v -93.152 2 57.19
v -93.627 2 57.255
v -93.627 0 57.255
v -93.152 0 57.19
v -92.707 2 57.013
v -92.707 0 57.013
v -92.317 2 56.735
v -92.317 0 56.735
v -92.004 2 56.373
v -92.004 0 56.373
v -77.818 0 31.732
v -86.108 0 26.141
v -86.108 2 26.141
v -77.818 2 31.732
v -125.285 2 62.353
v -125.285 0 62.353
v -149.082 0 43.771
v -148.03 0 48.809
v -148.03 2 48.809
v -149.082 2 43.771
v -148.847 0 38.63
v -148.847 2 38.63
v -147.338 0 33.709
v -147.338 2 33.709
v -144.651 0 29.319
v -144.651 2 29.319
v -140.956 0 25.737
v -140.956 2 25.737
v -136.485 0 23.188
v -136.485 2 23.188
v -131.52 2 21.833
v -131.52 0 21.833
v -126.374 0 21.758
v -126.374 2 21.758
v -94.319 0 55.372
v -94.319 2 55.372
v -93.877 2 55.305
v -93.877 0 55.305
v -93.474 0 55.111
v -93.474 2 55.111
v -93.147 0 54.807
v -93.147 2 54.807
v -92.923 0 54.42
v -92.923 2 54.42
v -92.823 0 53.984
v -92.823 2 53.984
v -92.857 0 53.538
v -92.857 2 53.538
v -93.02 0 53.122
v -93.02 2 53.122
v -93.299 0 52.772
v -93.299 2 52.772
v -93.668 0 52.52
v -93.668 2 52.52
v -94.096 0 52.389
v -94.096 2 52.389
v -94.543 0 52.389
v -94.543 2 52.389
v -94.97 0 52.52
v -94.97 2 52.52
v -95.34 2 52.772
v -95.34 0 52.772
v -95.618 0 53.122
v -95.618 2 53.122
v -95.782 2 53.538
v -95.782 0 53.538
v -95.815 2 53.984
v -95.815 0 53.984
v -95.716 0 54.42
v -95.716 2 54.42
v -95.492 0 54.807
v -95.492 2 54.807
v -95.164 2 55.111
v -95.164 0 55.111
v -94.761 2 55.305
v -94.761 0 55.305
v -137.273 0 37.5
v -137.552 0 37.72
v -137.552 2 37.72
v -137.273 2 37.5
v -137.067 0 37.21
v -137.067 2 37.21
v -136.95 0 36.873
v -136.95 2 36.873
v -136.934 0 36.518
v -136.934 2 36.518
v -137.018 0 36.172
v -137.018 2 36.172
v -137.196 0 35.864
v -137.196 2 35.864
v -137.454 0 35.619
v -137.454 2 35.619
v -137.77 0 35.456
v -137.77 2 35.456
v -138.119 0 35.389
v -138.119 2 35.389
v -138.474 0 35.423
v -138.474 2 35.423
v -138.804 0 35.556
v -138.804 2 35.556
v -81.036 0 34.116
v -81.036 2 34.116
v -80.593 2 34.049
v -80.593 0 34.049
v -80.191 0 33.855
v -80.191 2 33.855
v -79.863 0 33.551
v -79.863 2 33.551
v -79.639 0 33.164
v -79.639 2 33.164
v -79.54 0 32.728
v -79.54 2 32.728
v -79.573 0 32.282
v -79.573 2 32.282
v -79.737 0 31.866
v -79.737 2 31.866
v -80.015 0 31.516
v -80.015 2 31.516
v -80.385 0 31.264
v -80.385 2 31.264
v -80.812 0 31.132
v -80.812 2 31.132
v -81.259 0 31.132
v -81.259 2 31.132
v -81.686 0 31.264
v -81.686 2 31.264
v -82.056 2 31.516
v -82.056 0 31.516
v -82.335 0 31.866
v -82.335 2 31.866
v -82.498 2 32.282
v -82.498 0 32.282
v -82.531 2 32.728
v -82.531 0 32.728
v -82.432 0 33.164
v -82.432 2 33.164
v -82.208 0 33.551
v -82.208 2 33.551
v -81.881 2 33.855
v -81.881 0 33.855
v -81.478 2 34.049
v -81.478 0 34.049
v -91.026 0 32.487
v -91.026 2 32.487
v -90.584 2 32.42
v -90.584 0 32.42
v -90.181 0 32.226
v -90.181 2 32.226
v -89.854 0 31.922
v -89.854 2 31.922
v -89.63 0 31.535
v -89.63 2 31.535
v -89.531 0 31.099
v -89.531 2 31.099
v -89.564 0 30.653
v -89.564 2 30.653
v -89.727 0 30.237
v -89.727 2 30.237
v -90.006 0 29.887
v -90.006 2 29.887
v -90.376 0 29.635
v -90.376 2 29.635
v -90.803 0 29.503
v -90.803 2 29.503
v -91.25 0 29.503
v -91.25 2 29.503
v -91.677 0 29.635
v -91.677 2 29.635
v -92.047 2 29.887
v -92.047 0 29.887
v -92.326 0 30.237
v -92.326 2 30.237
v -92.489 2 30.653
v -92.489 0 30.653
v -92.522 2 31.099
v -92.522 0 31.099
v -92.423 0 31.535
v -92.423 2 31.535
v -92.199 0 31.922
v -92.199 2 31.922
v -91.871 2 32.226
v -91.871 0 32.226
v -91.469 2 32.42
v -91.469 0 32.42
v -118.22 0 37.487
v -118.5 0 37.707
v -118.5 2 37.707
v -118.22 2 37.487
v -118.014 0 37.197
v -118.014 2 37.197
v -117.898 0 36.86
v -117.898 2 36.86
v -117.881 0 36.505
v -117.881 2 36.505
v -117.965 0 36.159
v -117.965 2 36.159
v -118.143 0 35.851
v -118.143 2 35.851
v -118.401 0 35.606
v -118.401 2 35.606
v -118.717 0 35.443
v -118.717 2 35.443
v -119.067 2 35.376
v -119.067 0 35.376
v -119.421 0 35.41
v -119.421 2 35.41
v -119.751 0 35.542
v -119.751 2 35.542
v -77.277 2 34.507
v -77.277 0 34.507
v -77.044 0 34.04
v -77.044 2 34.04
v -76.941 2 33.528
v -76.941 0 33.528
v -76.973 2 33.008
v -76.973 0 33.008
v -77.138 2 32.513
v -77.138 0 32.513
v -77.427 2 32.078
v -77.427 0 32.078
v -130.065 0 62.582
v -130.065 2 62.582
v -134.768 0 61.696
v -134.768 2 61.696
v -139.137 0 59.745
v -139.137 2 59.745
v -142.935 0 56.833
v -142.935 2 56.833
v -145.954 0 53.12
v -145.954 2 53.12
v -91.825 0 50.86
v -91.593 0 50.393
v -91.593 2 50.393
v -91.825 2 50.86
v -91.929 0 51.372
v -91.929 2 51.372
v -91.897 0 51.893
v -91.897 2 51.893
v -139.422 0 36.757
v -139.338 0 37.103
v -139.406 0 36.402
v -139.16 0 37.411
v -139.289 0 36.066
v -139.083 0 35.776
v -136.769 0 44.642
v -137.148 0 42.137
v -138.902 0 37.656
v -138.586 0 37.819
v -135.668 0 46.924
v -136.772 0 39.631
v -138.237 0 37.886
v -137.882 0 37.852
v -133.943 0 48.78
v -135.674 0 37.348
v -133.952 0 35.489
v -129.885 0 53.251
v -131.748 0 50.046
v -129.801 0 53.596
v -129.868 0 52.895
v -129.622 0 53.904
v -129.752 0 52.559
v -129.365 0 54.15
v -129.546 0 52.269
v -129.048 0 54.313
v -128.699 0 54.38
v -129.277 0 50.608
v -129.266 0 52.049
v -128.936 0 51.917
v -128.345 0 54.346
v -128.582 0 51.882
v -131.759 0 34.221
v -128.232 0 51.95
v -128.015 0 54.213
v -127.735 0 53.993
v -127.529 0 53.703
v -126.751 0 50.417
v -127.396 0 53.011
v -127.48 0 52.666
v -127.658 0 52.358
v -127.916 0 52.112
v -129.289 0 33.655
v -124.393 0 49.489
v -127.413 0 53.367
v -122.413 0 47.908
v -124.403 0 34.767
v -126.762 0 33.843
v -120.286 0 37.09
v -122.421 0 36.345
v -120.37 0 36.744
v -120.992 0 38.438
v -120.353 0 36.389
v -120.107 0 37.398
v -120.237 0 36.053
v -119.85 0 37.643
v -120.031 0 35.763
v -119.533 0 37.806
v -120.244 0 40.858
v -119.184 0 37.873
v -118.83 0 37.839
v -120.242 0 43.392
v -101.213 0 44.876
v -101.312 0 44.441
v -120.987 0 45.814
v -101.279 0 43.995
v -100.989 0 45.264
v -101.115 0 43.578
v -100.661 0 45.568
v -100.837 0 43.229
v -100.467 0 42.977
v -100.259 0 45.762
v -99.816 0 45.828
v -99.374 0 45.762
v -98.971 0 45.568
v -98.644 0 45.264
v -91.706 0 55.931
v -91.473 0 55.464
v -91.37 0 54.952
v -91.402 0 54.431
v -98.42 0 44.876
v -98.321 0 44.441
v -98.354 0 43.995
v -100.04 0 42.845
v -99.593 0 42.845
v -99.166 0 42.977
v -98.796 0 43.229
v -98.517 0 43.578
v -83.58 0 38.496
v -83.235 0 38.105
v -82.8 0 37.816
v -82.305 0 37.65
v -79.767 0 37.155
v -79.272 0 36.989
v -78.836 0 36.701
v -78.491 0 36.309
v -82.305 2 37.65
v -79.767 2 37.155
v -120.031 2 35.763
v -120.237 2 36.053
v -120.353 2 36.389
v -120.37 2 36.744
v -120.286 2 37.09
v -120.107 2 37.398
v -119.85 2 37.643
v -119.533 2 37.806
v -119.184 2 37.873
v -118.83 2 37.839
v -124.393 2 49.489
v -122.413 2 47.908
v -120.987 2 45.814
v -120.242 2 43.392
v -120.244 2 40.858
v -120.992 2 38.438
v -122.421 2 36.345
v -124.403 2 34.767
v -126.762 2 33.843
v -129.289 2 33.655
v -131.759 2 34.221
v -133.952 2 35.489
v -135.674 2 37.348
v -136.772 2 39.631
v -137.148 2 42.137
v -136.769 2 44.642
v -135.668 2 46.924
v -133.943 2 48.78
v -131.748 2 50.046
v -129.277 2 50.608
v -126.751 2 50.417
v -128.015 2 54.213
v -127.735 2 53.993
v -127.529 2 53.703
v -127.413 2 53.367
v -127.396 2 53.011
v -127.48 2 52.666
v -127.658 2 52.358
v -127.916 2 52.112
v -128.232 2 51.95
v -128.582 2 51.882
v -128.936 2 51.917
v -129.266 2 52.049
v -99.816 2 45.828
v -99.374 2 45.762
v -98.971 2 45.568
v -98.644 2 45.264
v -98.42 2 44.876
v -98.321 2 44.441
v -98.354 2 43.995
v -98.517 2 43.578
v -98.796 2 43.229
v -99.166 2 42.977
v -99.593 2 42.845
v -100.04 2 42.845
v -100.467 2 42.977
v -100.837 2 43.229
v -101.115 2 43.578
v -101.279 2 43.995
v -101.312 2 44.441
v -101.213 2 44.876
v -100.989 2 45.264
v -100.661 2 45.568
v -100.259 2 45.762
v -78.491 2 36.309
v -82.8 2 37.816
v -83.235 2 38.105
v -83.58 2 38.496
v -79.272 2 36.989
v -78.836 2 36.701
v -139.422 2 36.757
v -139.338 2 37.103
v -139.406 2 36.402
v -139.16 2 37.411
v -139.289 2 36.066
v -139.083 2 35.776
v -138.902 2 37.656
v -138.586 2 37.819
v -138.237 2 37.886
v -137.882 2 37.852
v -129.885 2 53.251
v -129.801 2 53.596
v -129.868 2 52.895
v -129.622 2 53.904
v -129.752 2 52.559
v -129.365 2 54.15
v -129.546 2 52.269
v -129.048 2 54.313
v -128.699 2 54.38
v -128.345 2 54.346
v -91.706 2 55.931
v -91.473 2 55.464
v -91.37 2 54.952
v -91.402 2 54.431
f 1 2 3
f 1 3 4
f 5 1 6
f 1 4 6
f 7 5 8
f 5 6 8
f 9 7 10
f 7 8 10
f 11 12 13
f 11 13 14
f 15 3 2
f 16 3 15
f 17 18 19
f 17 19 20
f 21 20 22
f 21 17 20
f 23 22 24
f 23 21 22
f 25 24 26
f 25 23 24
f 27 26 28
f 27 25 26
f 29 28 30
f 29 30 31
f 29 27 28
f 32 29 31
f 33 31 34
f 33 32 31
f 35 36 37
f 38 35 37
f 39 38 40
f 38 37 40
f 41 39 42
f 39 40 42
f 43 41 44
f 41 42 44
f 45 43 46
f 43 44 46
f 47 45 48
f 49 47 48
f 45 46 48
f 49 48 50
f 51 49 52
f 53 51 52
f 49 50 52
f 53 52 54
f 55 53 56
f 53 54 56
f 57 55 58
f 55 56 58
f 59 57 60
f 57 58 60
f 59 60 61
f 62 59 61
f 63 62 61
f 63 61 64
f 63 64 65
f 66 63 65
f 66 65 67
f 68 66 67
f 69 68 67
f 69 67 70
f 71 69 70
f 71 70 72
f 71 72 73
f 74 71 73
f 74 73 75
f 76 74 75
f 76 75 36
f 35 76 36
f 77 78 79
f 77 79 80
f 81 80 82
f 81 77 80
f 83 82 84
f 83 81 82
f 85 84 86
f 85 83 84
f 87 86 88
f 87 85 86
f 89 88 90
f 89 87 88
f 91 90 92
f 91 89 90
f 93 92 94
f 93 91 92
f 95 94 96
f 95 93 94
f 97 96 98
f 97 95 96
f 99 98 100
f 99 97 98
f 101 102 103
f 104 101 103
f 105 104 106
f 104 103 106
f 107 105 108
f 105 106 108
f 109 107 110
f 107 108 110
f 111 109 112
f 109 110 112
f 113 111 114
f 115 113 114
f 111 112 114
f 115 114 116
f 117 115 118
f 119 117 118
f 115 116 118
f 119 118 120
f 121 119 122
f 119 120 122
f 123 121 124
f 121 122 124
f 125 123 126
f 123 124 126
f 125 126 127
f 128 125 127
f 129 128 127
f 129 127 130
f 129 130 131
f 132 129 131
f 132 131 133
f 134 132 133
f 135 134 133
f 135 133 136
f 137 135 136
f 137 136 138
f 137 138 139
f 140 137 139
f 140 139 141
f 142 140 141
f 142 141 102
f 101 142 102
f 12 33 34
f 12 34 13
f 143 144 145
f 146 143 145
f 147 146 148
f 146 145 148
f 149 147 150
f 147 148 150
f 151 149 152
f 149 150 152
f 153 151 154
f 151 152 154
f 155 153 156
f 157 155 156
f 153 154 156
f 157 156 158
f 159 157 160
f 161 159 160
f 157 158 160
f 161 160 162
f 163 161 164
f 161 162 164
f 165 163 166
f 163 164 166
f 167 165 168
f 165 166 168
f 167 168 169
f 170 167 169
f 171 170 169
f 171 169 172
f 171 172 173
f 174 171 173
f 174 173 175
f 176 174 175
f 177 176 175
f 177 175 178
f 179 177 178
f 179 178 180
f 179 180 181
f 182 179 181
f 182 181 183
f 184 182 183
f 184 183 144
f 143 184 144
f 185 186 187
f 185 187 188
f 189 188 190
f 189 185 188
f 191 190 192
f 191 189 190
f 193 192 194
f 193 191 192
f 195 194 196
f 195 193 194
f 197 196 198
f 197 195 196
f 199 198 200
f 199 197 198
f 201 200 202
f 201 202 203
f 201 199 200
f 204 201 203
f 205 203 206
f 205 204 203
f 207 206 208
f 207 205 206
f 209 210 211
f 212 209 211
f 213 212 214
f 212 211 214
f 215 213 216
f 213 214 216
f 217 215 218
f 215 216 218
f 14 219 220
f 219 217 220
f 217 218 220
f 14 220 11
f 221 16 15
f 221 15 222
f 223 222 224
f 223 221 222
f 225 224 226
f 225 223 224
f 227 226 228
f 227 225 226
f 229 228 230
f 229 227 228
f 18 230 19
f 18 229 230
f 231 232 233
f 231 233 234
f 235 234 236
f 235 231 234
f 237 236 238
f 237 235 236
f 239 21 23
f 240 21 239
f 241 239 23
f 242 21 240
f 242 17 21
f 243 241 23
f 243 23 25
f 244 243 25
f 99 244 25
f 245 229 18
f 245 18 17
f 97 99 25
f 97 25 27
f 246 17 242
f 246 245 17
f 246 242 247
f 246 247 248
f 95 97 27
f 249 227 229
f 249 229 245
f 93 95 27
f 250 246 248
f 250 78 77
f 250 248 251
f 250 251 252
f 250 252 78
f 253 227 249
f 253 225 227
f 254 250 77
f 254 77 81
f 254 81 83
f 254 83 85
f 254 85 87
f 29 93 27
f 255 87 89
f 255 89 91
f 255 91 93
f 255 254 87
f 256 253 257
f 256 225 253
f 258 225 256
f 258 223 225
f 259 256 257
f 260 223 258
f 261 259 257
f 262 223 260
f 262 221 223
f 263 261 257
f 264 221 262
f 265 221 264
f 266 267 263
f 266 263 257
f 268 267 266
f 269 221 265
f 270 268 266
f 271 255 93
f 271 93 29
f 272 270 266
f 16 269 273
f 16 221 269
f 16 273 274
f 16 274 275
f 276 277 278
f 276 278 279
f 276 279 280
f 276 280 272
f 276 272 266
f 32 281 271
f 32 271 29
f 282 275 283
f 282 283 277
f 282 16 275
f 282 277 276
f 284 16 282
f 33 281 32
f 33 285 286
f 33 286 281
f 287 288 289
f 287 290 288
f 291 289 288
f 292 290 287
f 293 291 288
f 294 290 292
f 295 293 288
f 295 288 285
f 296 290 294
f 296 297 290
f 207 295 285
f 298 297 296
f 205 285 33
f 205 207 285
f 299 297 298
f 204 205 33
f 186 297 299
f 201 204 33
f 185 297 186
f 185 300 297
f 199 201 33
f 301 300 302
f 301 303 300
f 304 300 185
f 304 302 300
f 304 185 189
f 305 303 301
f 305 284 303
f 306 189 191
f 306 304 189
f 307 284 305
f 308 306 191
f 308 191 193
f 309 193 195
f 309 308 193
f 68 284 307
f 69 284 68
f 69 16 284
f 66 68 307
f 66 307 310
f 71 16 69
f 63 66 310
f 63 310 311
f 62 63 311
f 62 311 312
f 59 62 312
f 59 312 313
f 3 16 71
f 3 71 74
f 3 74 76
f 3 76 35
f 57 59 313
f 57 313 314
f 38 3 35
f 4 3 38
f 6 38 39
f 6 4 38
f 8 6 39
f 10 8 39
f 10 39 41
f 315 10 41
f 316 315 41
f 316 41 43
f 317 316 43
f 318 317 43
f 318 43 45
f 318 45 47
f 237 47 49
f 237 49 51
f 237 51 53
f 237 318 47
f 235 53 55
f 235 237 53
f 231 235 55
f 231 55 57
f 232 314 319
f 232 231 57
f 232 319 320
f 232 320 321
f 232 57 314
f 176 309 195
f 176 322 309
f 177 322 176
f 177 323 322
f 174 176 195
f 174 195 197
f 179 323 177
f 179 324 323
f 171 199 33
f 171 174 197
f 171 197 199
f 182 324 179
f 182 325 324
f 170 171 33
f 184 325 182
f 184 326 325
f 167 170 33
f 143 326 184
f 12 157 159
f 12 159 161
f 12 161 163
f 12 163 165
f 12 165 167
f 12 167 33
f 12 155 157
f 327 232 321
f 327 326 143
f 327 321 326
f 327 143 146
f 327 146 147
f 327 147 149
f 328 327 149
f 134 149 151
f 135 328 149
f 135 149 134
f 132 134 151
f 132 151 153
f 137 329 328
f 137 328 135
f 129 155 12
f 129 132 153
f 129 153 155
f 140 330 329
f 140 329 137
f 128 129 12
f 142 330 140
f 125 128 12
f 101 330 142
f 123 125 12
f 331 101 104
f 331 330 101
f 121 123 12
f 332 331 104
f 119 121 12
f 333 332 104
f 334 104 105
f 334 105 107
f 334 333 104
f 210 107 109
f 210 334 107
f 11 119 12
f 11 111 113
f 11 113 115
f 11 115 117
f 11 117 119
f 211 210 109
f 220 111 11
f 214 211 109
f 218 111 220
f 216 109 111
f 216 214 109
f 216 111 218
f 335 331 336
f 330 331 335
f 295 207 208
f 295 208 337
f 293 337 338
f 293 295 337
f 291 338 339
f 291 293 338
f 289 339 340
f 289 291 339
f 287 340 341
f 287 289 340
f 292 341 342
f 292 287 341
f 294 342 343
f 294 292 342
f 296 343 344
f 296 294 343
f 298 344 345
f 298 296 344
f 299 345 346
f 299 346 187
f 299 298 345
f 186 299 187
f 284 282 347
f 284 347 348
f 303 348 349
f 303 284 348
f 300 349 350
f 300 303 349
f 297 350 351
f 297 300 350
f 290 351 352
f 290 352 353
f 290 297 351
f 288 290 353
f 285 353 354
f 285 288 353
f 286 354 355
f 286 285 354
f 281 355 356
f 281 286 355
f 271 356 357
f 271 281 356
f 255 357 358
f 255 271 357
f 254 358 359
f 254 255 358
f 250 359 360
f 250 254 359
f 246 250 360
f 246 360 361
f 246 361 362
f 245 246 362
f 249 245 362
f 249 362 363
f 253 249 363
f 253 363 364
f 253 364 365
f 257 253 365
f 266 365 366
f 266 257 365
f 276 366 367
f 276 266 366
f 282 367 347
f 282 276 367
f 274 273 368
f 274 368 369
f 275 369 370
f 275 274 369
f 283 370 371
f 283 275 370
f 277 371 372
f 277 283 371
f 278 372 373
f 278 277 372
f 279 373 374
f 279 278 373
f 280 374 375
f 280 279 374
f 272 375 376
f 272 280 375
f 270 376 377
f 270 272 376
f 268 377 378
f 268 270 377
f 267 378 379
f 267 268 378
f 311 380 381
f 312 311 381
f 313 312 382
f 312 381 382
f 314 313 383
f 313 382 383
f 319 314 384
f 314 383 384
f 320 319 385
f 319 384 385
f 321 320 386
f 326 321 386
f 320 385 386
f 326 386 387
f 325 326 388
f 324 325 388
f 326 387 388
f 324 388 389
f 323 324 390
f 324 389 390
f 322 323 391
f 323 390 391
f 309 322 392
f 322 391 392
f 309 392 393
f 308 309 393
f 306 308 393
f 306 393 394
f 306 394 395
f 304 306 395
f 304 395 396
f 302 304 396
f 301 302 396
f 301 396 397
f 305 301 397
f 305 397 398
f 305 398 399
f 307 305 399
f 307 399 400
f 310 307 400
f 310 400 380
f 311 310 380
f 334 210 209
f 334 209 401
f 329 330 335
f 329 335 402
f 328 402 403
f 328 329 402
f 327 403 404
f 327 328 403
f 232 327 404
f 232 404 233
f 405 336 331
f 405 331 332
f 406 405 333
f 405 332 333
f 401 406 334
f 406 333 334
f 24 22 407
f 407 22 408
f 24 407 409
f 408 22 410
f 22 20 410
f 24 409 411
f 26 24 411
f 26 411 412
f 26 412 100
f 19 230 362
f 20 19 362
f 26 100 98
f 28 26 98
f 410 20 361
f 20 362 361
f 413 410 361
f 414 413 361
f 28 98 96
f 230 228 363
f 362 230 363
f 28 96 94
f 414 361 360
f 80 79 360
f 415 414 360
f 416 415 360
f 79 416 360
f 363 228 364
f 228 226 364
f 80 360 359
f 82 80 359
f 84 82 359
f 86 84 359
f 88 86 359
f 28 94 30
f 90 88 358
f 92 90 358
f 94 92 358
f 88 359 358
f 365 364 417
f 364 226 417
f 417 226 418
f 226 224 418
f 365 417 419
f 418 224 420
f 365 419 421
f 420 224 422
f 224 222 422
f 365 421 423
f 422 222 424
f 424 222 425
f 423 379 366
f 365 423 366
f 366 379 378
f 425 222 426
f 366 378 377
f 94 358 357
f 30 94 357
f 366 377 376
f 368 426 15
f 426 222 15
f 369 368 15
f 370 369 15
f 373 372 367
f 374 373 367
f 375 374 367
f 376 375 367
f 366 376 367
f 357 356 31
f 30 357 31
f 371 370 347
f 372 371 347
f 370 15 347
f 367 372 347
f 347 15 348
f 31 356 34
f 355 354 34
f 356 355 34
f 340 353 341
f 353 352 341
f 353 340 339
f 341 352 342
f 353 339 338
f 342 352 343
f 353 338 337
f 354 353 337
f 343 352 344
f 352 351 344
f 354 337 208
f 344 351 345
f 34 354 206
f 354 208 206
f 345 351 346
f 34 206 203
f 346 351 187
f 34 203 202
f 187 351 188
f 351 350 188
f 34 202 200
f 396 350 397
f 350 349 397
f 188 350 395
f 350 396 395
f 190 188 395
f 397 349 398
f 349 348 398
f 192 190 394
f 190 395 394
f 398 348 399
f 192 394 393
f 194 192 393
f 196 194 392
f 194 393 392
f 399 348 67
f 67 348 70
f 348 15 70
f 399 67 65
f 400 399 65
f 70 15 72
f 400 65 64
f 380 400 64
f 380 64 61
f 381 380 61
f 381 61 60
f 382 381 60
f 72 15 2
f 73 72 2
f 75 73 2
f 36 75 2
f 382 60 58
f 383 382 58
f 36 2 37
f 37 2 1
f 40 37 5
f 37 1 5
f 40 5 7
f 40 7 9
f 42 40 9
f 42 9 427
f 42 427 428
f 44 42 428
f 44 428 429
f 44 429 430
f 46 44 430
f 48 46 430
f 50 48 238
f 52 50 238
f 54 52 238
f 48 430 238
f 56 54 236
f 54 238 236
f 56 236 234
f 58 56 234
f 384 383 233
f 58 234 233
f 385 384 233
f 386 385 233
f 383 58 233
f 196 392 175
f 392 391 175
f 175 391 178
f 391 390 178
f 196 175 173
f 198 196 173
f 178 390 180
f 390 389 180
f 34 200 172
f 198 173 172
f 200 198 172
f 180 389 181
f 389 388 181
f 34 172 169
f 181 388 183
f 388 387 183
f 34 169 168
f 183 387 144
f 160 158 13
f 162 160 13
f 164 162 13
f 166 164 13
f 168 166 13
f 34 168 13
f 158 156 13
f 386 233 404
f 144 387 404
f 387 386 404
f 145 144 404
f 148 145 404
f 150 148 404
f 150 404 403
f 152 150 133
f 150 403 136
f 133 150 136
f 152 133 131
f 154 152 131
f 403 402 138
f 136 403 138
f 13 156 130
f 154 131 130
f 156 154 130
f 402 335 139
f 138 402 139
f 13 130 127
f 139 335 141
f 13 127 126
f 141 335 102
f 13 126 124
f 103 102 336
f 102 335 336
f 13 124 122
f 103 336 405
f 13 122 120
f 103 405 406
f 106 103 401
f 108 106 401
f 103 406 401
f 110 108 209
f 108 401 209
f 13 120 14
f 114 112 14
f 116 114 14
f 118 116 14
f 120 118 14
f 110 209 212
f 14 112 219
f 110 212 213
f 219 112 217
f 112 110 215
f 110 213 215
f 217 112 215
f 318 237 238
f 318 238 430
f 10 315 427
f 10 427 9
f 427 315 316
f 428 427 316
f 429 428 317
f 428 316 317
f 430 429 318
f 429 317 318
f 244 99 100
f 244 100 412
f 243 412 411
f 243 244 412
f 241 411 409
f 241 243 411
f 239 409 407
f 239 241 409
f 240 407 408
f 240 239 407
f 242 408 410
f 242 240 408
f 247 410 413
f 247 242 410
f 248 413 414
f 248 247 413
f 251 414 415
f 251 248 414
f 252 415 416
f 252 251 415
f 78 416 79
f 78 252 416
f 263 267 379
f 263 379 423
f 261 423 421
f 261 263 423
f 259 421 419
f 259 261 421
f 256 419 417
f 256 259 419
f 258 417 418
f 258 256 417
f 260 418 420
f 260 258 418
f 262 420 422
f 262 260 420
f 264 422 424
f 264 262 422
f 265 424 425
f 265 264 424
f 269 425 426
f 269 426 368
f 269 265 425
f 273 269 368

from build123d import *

# Parameters (mm, degrees)
BOSS_EXTRUDE1_DEPTH = 2
SKETCH2_R           = 1.5
CUT_EXTRUDE1_DEPTH  = 162.776916151
FILLET1_R           = 2


with BuildPart() as part:
    # Sketch1 → Boss-Extrude1 (new body)
    with BuildSketch(Plane(origin=(0, 0, 0), x_dir=(1, 0, 0), z_dir=(0, 1, 0))):
        with BuildLine():
            Line((-93.626923886, -57.255296936), (-125.285208035, -62.353434177))
            ThreePointArc((-125.285208035, -62.353434177), (-139.136930256, -59.744510113), (-148.029903031, -48.8087098))
            ThreePointArc((-148.029903031, -48.8087098), (-144.651370762, -29.319378812), (-126.373822338, -21.757651079))
            Line((-126.373822338, -21.757651079), (-86.108085396, -26.140585529))
            Line((-86.108085396, -26.140585529), (-76.160414707, -32.849365164))
            Line((-76.160414707, -32.849365164), (-78.953515167, -36.996483419))
            Line((-78.953515167, -36.996483419), (-83.117646396, -37.808894096))
            Line((-83.117646396, -37.808894096), (-92.055567869, -51.079672511))
            Line((-92.055567869, -51.079672511), (-91.243157193, -55.24380374))
            Line((-91.243157193, -55.24380374), (-92.919017469, -57.732074693))
            Line((-92.919017469, -57.732074693), (-93.626923886, -57.255296936))
        make_face()
        with BuildLine():
            ThreePointArc((-128.01465119, -54.213221054), (-127.558293409, -52.505375167), (-129.266139297, -52.049017386))
            ThreePointArc((-129.266139297, -52.049017386), (-129.722497078, -53.756863273), (-128.01465119, -54.213221054))
        make_face(mode=Mode.SUBTRACT)
        with BuildLine():
            ThreePointArc((-118.499717146, -37.706675985), (-118.043359364, -35.998830097), (-119.751205252, -35.542472316))
            ThreePointArc((-119.751205252, -35.542472316), (-120.207563033, -37.250318204), (-118.499717146, -37.706675985))
        make_face(mode=Mode.SUBTRACT)
        with BuildLine():
            ThreePointArc((-137.552271527, -37.719773921), (-137.095913745, -36.011928034), (-138.803759633, -35.555570253))
            ThreePointArc((-138.803759633, -35.555570253), (-139.260117414, -37.26341614), (-137.552271527, -37.719773921))
        make_face(mode=Mode.SUBTRACT)
        with BuildLine():
            ThreePointArc((-132.903016903, -34.772829346), (-136.006249814, -46.386181381), (-124.392897779, -49.489414293))
            ThreePointArc((-124.392897779, -49.489414293), (-121.289664867, -37.876062257), (-132.903016903, -34.772829346))
        make_face(mode=Mode.SUBTRACT)
    extrude(amount=BOSS_EXTRUDE1_DEPTH)

    # Sketch2 → Cut-Extrude1 (cut, through all)
    with BuildSketch(Plane(origin=(0, 2, 0), x_dir=(1, 0, 0), z_dir=(0, 1, 0))):
        with Locations(Location((-94.319257895, -53.871812037, 0), (0, 0, 270))):
            Circle(SKETCH2_R)
        with Locations(Location((-81.035580782, -32.615630622, 0), (0, 0, 270))):
            Circle(SKETCH2_R)
        with Locations(Location((-99.81641988, -44.328419171, 0), (0, 0, 270))):
            Circle(SKETCH2_R)
        with Locations(Location((-91.026470018, -30.986543755, 0), (0, 0, 270))):
            Circle(SKETCH2_R)
    extrude(amount=-CUT_EXTRUDE1_DEPTH, mode=Mode.SUBTRACT)

    # Fillet1
    # the kernel refuses this fillet: 2 mm, written as the material it adds along each edge
    with BuildSketch(Plane(origin=(-83.117646396, 0, 37.808894096), x_dir=(-0.558620092060103, 0, 0.8294236509448968), z_dir=(0, 1, 0)), Plane(origin=(-92.055567869, 0, 51.079672511), x_dir=(0.191487032856868, 0, 0.9814951432623968), z_dir=(0, 1, 0))) as fillet1_piece_1:
        with BuildLine():
            CenterArc((FILLET1_R * 0.414213562373, FILLET1_R), FILLET1_R, 225, 45)
            Line((-FILLET1_R * 0.292893218813, FILLET1_R * 0.292893218813), (0, 0))
            Line((0, 0), (FILLET1_R * 0.414213562373, 0))
        make_face()
    extrude(amount=2)
    # the kernel refuses this fillet: 2 mm, written as the material it takes off along each edge
    with BuildSketch(Plane(origin=(-76.160414707, -4.996895665, 32.849365164), x_dir=(-0.8290765545202242, 0, -0.5591351059850148), z_dir=(0, 1, 0))) as fillet1_2_piece_1:
        with BuildLine():
            CenterArc((FILLET1_R * 0.999379132971, FILLET1_R), FILLET1_R, 180.035584106, 89.964415894)
            Line((-FILLET1_R * 0.000620674171049, FILLET1_R * 0.999378940233), (0, 0))
            Line((0, 0), (FILLET1_R * 0.999379132971, 0))
        make_face()
    extrude(amount=11.99379133, mode=Mode.SUBTRACT)
    with BuildSketch(Plane(origin=(-78.953515167, -2.071067812, 36.996483419), x_dir=(0.558620092060111, 0, -0.8294236509448913), z_dir=(0, 1, 0))) as fillet1_2_piece_2:
        with BuildLine():
            CenterArc((FILLET1_R * 0.414213562373, FILLET1_R), FILLET1_R, 225, 45)
            Line((-FILLET1_R * 0.292893218813, FILLET1_R * 0.292893218813), (0, 0))
            Line((0, 0), (FILLET1_R * 0.414213562373, 0))
        make_face()
    extrude(amount=6.142135624, mode=Mode.SUBTRACT)
    with BuildSketch(Plane(origin=(-92.919017469, -4.096888539, 57.732074693), x_dir=(-0.8294236509413199, 0, -0.5586200920654141), z_dir=(0, 1, 0))) as fillet1_2_piece_3:
        with BuildLine():
            CenterArc((2, -1.638755416), FILLET1_R, 124.977451645, 55.022548355)
            Line((0, -1.638755416), (0, 0))
            Line((0, 0), (0.853491959, 0))
        make_face()
    extrude(amount=10.193777079, mode=Mode.SUBTRACT)
    with BuildSketch(Plane(origin=(-91.243157193, -2.071067812, 55.24380374), x_dir=(-0.558620092060103, 0, 0.8294236509448968), z_dir=(0, 1, 0))) as fillet1_2_piece_4:
        with BuildLine():
            CenterArc((FILLET1_R * 0.414213562373, -FILLET1_R), FILLET1_R, 90, 45)
            Line((-FILLET1_R * 0.292893218813, -FILLET1_R * 0.292893218813), (0, 0))
            Line((0, 0), (FILLET1_R * 0.414213562373, 0))
        make_face()
    extrude(amount=6.142135624, mode=Mode.SUBTRACT)


solid = part.part
